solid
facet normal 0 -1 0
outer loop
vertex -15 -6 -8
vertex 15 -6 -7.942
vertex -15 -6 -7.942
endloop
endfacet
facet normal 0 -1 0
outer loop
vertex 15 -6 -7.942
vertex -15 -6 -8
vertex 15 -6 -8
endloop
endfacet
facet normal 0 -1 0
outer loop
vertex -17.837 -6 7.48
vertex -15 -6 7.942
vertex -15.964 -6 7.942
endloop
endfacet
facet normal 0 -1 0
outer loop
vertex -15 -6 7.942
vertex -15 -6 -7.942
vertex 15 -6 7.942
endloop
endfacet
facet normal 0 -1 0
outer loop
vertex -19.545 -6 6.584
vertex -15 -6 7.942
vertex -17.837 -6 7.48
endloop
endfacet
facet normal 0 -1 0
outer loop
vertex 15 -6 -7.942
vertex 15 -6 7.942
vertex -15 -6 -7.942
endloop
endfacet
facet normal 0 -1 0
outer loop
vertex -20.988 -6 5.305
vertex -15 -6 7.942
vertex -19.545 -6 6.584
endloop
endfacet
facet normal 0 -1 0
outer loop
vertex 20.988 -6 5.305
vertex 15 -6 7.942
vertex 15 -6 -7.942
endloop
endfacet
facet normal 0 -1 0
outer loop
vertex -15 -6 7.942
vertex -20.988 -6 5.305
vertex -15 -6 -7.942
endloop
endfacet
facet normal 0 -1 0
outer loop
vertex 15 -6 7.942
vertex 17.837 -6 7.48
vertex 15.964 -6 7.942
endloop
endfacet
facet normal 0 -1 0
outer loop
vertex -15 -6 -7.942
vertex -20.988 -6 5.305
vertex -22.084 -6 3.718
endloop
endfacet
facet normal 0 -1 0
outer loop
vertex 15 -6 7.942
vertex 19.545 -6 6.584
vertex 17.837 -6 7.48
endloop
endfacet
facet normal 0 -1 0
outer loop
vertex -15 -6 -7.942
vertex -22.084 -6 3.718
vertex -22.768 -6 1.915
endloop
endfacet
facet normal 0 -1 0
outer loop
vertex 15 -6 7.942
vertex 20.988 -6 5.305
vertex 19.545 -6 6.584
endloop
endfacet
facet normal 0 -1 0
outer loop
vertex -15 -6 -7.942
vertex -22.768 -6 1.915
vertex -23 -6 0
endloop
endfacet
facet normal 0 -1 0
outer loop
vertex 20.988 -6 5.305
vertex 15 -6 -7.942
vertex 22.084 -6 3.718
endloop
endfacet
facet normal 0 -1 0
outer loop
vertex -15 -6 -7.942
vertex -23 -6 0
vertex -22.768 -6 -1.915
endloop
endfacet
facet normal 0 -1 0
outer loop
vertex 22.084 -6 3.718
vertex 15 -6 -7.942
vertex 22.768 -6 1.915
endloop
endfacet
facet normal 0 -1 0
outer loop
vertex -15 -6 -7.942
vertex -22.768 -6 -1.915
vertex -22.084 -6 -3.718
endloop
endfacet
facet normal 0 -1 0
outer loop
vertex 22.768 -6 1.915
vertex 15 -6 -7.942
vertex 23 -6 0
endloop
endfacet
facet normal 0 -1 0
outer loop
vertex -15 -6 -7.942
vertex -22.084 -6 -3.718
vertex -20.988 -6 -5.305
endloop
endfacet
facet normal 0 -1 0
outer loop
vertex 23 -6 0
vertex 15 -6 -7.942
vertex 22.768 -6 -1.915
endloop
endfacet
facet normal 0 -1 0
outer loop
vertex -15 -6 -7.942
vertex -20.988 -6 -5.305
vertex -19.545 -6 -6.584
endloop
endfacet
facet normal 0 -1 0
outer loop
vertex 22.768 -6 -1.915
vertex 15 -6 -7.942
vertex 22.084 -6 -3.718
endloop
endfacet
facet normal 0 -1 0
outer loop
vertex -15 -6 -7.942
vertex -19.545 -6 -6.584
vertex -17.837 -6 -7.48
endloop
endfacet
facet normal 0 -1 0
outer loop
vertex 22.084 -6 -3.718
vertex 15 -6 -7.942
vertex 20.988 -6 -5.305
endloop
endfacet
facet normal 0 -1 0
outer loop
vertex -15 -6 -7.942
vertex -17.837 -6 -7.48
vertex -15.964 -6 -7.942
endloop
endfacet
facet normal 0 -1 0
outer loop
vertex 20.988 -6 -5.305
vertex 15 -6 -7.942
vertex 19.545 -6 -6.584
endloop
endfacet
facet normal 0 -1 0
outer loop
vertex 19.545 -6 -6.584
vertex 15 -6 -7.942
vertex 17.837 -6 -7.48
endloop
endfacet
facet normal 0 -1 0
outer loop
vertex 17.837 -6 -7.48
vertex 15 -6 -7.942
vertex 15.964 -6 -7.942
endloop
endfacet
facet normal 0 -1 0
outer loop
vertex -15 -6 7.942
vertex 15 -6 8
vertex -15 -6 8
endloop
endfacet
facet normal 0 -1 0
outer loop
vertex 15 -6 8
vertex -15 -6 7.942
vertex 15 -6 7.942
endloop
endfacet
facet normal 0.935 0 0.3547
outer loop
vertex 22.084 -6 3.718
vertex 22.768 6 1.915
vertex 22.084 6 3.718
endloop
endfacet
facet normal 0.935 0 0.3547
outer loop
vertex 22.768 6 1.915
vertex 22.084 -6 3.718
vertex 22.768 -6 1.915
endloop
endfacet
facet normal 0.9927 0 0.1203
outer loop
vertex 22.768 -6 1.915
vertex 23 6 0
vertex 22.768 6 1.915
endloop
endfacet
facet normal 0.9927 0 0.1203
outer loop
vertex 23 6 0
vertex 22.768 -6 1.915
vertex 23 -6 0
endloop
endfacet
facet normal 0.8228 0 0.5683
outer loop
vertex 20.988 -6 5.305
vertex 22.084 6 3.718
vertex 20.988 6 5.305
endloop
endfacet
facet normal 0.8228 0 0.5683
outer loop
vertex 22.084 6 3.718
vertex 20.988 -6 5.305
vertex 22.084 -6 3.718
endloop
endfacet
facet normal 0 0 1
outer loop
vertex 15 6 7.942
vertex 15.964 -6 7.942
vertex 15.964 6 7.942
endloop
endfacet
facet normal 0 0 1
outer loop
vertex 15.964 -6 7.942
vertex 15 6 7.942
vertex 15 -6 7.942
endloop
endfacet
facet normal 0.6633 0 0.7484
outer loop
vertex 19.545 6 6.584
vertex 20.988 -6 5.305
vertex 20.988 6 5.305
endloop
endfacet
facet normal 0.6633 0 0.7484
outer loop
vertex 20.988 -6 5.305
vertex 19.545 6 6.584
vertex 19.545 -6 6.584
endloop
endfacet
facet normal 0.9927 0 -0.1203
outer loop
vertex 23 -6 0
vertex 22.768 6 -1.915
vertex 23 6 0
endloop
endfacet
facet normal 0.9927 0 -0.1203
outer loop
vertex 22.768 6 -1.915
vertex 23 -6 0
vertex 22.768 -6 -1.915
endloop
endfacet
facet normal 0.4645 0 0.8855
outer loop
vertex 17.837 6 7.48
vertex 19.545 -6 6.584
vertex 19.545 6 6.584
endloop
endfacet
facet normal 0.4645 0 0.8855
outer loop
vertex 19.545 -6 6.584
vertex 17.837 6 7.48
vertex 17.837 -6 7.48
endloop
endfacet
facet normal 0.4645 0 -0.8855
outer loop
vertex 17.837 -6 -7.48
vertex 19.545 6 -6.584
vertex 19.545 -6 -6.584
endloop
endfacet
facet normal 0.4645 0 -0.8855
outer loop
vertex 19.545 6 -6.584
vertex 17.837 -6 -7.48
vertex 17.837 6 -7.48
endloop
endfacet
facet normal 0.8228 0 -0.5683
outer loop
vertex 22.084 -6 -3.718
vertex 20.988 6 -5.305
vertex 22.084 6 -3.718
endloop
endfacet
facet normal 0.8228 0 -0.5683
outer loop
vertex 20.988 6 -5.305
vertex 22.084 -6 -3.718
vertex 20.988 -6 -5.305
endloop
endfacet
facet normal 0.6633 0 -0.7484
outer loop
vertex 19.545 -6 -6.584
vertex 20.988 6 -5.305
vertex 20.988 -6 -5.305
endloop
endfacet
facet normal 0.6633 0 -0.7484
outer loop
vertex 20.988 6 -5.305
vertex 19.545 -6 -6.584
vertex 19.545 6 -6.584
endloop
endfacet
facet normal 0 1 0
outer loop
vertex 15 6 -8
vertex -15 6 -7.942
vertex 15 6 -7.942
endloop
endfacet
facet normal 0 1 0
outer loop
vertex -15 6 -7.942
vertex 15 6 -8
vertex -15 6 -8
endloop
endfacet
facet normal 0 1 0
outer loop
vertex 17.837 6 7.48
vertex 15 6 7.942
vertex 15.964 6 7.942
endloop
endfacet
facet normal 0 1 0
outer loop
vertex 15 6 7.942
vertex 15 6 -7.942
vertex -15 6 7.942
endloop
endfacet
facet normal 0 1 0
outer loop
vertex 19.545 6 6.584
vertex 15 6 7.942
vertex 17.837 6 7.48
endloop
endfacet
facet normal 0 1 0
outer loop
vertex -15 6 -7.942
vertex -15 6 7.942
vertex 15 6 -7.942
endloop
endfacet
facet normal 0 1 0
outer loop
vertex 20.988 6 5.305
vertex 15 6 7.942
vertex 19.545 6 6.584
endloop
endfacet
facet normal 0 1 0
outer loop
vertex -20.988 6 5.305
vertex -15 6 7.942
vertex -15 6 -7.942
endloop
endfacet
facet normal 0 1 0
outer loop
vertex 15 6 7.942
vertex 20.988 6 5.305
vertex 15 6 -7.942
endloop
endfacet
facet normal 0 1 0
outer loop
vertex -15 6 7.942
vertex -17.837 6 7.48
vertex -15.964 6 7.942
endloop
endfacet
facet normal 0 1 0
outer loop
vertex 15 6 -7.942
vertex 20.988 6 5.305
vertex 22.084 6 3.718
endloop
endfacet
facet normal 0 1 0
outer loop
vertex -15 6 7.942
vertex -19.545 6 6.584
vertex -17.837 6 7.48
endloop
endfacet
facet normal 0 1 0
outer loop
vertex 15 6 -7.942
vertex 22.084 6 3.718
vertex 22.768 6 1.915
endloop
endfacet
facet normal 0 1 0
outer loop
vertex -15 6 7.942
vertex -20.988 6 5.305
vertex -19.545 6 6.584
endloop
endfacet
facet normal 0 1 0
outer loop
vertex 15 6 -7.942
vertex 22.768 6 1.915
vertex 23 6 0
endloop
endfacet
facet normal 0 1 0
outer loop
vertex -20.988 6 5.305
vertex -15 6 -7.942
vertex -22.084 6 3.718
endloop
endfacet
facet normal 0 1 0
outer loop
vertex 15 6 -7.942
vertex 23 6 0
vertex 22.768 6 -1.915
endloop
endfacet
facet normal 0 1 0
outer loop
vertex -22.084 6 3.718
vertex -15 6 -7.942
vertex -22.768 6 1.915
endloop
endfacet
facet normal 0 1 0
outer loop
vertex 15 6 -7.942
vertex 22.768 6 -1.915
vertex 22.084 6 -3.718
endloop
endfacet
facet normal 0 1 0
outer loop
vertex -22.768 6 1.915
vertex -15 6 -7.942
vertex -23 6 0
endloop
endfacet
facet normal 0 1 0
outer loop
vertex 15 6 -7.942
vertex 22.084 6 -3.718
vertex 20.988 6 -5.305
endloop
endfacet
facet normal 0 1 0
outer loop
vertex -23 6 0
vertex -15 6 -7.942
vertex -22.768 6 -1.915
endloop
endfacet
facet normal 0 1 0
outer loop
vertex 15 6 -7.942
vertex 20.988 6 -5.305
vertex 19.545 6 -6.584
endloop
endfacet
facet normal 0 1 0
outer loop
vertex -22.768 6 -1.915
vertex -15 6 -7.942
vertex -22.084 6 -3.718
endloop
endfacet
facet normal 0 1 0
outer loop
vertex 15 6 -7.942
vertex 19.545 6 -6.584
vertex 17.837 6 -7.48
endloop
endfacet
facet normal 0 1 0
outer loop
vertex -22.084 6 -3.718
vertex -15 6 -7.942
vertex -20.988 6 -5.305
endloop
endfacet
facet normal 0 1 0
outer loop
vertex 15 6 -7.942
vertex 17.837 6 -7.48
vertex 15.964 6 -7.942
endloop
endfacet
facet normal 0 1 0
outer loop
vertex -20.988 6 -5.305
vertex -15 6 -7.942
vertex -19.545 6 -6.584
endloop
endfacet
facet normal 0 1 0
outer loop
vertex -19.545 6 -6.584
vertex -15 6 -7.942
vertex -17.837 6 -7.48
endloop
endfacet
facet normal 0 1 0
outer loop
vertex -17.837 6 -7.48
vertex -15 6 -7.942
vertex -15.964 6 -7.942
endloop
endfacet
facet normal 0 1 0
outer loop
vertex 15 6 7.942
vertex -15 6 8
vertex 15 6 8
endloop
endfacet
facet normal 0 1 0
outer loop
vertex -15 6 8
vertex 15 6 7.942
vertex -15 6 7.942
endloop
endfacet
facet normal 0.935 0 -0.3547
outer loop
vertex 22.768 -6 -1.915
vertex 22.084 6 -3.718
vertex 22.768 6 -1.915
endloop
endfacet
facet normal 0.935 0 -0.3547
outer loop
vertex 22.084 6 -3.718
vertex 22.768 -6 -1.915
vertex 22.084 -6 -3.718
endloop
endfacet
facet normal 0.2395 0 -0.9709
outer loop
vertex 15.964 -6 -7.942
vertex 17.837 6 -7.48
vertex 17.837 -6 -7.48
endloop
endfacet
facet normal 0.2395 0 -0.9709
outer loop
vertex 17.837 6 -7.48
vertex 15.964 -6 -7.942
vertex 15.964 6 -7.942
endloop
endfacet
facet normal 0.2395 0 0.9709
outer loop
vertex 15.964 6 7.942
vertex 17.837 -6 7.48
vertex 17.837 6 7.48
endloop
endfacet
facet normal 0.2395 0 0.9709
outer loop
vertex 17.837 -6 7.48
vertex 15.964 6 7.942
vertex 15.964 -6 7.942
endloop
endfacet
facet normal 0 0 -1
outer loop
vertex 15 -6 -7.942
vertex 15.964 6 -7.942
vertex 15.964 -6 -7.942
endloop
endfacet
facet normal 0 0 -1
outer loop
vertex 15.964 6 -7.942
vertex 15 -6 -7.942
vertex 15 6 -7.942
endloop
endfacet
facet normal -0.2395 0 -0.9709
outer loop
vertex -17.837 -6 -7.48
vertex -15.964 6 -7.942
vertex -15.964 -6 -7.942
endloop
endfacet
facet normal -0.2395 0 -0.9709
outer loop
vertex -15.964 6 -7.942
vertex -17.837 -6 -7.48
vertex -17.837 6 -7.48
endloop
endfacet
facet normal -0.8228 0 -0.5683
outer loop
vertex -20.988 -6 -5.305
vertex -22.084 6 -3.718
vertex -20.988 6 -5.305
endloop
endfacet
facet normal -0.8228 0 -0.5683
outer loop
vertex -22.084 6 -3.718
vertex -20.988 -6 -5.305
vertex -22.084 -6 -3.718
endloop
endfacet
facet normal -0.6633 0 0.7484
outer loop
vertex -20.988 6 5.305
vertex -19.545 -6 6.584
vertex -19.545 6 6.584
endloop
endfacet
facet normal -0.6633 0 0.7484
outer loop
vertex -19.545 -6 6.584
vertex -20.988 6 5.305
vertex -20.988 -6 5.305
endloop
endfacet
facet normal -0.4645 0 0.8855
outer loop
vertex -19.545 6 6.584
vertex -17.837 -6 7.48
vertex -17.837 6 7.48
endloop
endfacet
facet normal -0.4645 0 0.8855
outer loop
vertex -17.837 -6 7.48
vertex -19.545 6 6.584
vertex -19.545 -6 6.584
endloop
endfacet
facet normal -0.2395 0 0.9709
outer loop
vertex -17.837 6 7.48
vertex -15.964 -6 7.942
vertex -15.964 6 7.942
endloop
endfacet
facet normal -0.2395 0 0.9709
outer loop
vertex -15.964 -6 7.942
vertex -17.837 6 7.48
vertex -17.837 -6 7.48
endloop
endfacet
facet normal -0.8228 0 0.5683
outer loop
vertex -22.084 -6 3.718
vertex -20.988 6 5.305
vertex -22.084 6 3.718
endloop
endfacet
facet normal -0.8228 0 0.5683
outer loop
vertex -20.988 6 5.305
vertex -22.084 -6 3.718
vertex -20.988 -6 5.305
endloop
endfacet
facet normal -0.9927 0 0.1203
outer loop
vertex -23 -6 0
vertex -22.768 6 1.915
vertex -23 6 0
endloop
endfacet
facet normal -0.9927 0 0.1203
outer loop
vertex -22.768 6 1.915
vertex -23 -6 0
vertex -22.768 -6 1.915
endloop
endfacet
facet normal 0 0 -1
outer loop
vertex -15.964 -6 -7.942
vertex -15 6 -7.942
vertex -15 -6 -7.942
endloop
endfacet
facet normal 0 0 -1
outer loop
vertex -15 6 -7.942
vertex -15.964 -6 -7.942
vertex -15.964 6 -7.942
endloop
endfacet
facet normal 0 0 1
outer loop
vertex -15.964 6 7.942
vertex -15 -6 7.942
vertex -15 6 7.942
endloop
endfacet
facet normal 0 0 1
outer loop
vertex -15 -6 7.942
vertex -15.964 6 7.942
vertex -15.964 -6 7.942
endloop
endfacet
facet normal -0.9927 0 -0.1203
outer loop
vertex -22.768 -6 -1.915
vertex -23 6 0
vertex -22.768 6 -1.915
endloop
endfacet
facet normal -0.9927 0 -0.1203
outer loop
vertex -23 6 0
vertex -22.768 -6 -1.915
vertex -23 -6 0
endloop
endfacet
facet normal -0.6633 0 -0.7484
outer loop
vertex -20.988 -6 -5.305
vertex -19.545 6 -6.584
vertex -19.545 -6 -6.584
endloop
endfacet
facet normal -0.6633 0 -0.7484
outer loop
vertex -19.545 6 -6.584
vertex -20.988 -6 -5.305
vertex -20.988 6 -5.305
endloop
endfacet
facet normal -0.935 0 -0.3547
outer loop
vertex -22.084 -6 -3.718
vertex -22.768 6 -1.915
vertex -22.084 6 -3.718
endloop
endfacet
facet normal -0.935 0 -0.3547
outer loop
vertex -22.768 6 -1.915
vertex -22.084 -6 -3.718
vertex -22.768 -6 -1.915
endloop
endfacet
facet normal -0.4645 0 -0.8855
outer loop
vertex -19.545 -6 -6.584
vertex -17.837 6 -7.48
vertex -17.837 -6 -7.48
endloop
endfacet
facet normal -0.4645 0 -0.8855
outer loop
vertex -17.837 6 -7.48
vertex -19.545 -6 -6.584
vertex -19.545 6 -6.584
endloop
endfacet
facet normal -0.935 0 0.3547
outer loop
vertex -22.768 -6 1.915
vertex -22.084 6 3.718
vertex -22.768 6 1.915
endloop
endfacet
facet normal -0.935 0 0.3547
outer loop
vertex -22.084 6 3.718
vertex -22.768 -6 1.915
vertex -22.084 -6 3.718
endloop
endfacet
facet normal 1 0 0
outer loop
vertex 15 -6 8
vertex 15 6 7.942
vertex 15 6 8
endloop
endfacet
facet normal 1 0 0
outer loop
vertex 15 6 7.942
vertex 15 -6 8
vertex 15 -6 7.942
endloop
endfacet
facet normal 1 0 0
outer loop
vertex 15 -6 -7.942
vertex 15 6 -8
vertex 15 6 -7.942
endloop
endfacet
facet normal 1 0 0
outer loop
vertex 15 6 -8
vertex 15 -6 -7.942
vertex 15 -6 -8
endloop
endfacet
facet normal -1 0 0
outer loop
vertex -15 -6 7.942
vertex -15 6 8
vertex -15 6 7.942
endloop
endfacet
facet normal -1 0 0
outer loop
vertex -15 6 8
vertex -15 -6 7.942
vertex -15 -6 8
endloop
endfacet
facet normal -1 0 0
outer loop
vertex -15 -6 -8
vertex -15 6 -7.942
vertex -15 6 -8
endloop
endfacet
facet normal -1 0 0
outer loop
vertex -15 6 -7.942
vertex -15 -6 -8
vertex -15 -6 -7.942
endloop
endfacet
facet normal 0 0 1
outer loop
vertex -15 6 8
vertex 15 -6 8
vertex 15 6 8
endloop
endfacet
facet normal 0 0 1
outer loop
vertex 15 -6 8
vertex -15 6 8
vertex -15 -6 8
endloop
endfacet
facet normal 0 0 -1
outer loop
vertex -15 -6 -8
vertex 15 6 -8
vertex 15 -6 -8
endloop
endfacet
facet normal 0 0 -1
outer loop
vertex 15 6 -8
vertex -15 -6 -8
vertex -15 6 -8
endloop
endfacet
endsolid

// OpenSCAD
module oval(clength, cradius, cthick) {
	rotate([90,0,0]) union() {
		translate([clength/2,0,0]) cylinder(h = cthick,r = cradius, center = true);
		translate([-clength/2,0,0]) cylinder(h = cthick, r = cradius, center = true);
		cube(size = [clength, cradius*2, cthick], center = true);
	}
}
module caterpillar(clength, cradius, cthick) {
	color([0.1,0.1,0.1,1]) {
		difference() {
			oval(clength, cradius, cthick);
			oval(clength, cradius*0.9, cthick*1.1);
		}
	}
	color([0.8,0.8,0.8,1]) {
		oval(clength, cradius*0.9, cthick);
	}
}

translate([0, 0, 0]) caterpillar(30, 8, 12);
